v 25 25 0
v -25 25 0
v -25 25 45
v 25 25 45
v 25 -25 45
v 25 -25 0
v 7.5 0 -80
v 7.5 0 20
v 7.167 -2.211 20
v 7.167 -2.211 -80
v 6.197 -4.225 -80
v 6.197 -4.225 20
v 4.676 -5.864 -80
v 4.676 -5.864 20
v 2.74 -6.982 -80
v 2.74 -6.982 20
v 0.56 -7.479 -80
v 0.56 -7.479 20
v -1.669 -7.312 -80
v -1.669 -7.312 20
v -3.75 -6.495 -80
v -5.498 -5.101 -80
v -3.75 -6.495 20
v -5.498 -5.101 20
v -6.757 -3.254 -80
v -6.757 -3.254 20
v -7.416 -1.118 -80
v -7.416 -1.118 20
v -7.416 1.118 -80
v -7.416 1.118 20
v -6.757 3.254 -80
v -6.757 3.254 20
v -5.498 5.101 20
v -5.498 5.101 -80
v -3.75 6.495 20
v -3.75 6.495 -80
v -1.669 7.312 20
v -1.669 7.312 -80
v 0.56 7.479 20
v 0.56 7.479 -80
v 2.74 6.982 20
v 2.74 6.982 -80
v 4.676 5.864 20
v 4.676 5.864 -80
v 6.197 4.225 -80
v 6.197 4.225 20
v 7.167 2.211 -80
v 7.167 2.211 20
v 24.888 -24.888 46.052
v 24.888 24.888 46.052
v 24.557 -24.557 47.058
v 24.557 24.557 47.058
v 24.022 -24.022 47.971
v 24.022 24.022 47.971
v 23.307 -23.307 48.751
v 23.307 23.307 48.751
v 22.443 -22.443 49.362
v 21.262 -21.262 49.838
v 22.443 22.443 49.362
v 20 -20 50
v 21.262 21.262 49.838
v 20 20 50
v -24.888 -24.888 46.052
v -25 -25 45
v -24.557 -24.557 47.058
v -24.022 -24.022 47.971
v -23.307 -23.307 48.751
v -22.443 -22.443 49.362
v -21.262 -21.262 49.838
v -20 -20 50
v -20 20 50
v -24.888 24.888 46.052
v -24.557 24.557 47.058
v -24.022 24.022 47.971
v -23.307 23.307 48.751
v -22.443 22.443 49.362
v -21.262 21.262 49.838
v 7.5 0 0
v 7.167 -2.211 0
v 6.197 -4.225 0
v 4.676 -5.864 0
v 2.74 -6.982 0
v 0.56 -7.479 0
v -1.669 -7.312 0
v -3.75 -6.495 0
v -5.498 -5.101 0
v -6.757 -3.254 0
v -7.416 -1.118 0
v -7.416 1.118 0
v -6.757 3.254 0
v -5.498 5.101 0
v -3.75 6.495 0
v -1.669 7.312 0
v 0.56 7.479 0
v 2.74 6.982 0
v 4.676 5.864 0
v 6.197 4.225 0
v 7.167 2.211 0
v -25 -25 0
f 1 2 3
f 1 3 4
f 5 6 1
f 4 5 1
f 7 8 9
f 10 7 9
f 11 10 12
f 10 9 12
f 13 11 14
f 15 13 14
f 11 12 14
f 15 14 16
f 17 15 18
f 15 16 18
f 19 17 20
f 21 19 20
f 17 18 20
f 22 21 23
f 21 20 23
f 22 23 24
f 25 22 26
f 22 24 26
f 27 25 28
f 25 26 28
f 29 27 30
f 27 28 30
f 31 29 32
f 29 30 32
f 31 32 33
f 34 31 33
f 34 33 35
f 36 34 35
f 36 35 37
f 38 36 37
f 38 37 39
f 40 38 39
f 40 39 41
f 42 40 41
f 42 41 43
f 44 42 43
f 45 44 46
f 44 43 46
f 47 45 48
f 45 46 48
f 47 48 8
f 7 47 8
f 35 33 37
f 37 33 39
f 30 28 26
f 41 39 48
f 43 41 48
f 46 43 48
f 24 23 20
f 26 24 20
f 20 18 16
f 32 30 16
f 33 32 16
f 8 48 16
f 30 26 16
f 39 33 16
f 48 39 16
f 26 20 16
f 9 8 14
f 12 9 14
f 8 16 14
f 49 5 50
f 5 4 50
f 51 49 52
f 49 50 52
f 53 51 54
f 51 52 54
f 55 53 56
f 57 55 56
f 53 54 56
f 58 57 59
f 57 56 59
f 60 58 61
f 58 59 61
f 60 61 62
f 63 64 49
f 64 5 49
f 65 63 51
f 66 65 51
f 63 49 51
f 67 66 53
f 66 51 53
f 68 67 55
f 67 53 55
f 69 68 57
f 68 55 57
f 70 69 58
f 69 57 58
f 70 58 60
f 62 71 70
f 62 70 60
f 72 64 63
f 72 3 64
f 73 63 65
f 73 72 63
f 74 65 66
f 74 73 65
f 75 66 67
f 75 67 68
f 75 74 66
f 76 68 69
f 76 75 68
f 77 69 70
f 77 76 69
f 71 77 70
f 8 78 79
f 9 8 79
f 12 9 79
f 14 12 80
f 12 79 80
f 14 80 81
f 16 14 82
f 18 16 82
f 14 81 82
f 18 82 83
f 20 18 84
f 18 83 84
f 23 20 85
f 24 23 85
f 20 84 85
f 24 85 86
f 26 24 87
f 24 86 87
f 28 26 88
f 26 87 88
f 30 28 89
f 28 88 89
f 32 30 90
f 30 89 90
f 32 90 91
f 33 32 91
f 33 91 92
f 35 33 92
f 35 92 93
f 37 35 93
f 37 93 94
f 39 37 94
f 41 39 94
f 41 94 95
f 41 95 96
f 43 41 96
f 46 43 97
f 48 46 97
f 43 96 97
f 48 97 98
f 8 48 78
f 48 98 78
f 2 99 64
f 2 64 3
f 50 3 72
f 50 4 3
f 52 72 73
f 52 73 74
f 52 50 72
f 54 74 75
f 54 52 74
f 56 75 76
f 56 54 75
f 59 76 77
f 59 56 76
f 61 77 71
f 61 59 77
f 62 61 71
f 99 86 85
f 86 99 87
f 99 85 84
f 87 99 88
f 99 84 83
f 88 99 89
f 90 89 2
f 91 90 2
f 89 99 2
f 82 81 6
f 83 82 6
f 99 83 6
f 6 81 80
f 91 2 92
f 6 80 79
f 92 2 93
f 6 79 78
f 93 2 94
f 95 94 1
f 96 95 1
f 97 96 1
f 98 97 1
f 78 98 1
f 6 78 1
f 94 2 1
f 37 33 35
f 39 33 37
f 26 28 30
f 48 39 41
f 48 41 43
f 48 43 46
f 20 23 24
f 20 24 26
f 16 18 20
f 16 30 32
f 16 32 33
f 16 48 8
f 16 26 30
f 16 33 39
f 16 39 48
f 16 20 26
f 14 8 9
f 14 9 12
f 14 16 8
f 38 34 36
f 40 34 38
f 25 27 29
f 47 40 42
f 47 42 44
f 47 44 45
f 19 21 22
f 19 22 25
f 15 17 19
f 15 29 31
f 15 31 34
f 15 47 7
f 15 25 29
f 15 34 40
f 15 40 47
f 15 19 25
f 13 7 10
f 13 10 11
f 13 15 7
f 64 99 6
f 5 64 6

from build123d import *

# Parameters (mm, degrees)
F0_W      = 50
F0_H      = 50
F1_DEPTH  = 50
F2_R      = 5
F3_R      = 7.5
F4_DEPTH  = 20
F4_FACE_R = 7.5
F5_DEPTH  = 100


with BuildPart() as f1:
    # F0 (on Top) → F1 (new body)
    with BuildSketch(Plane.XY):
        Rectangle(F0_W, F0_H)
    extrude(amount=F1_DEPTH)

    # F2
    f2_edges = [f1.edges().sort_by_distance(p)[0] for p in [
        (25, 0, 50),
        (0, 25, 50),
        (-25, 0, 50),
        (0, -25, 50),
    ]]
    fillet(f2_edges, radius=F2_R)

    # F3 (on face) → F4 (cut)
    with BuildSketch(Plane(origin=(0, 0, 0), x_dir=(1, 0, 0), z_dir=(0, 0, -1))):
        Circle(F3_R)
    extrude(amount=-F4_DEPTH, mode=Mode.SUBTRACT)


with BuildPart() as f5:
    # F4_face (on face) → F5 (new body)
    with BuildSketch(Plane(origin=(0, 0, 20), x_dir=(1, 0, 0), z_dir=(0, 0, -1))):
        Circle(F4_FACE_R)
    extrude(amount=F5_DEPTH)


solid = Compound([f1.part, f5.part])
